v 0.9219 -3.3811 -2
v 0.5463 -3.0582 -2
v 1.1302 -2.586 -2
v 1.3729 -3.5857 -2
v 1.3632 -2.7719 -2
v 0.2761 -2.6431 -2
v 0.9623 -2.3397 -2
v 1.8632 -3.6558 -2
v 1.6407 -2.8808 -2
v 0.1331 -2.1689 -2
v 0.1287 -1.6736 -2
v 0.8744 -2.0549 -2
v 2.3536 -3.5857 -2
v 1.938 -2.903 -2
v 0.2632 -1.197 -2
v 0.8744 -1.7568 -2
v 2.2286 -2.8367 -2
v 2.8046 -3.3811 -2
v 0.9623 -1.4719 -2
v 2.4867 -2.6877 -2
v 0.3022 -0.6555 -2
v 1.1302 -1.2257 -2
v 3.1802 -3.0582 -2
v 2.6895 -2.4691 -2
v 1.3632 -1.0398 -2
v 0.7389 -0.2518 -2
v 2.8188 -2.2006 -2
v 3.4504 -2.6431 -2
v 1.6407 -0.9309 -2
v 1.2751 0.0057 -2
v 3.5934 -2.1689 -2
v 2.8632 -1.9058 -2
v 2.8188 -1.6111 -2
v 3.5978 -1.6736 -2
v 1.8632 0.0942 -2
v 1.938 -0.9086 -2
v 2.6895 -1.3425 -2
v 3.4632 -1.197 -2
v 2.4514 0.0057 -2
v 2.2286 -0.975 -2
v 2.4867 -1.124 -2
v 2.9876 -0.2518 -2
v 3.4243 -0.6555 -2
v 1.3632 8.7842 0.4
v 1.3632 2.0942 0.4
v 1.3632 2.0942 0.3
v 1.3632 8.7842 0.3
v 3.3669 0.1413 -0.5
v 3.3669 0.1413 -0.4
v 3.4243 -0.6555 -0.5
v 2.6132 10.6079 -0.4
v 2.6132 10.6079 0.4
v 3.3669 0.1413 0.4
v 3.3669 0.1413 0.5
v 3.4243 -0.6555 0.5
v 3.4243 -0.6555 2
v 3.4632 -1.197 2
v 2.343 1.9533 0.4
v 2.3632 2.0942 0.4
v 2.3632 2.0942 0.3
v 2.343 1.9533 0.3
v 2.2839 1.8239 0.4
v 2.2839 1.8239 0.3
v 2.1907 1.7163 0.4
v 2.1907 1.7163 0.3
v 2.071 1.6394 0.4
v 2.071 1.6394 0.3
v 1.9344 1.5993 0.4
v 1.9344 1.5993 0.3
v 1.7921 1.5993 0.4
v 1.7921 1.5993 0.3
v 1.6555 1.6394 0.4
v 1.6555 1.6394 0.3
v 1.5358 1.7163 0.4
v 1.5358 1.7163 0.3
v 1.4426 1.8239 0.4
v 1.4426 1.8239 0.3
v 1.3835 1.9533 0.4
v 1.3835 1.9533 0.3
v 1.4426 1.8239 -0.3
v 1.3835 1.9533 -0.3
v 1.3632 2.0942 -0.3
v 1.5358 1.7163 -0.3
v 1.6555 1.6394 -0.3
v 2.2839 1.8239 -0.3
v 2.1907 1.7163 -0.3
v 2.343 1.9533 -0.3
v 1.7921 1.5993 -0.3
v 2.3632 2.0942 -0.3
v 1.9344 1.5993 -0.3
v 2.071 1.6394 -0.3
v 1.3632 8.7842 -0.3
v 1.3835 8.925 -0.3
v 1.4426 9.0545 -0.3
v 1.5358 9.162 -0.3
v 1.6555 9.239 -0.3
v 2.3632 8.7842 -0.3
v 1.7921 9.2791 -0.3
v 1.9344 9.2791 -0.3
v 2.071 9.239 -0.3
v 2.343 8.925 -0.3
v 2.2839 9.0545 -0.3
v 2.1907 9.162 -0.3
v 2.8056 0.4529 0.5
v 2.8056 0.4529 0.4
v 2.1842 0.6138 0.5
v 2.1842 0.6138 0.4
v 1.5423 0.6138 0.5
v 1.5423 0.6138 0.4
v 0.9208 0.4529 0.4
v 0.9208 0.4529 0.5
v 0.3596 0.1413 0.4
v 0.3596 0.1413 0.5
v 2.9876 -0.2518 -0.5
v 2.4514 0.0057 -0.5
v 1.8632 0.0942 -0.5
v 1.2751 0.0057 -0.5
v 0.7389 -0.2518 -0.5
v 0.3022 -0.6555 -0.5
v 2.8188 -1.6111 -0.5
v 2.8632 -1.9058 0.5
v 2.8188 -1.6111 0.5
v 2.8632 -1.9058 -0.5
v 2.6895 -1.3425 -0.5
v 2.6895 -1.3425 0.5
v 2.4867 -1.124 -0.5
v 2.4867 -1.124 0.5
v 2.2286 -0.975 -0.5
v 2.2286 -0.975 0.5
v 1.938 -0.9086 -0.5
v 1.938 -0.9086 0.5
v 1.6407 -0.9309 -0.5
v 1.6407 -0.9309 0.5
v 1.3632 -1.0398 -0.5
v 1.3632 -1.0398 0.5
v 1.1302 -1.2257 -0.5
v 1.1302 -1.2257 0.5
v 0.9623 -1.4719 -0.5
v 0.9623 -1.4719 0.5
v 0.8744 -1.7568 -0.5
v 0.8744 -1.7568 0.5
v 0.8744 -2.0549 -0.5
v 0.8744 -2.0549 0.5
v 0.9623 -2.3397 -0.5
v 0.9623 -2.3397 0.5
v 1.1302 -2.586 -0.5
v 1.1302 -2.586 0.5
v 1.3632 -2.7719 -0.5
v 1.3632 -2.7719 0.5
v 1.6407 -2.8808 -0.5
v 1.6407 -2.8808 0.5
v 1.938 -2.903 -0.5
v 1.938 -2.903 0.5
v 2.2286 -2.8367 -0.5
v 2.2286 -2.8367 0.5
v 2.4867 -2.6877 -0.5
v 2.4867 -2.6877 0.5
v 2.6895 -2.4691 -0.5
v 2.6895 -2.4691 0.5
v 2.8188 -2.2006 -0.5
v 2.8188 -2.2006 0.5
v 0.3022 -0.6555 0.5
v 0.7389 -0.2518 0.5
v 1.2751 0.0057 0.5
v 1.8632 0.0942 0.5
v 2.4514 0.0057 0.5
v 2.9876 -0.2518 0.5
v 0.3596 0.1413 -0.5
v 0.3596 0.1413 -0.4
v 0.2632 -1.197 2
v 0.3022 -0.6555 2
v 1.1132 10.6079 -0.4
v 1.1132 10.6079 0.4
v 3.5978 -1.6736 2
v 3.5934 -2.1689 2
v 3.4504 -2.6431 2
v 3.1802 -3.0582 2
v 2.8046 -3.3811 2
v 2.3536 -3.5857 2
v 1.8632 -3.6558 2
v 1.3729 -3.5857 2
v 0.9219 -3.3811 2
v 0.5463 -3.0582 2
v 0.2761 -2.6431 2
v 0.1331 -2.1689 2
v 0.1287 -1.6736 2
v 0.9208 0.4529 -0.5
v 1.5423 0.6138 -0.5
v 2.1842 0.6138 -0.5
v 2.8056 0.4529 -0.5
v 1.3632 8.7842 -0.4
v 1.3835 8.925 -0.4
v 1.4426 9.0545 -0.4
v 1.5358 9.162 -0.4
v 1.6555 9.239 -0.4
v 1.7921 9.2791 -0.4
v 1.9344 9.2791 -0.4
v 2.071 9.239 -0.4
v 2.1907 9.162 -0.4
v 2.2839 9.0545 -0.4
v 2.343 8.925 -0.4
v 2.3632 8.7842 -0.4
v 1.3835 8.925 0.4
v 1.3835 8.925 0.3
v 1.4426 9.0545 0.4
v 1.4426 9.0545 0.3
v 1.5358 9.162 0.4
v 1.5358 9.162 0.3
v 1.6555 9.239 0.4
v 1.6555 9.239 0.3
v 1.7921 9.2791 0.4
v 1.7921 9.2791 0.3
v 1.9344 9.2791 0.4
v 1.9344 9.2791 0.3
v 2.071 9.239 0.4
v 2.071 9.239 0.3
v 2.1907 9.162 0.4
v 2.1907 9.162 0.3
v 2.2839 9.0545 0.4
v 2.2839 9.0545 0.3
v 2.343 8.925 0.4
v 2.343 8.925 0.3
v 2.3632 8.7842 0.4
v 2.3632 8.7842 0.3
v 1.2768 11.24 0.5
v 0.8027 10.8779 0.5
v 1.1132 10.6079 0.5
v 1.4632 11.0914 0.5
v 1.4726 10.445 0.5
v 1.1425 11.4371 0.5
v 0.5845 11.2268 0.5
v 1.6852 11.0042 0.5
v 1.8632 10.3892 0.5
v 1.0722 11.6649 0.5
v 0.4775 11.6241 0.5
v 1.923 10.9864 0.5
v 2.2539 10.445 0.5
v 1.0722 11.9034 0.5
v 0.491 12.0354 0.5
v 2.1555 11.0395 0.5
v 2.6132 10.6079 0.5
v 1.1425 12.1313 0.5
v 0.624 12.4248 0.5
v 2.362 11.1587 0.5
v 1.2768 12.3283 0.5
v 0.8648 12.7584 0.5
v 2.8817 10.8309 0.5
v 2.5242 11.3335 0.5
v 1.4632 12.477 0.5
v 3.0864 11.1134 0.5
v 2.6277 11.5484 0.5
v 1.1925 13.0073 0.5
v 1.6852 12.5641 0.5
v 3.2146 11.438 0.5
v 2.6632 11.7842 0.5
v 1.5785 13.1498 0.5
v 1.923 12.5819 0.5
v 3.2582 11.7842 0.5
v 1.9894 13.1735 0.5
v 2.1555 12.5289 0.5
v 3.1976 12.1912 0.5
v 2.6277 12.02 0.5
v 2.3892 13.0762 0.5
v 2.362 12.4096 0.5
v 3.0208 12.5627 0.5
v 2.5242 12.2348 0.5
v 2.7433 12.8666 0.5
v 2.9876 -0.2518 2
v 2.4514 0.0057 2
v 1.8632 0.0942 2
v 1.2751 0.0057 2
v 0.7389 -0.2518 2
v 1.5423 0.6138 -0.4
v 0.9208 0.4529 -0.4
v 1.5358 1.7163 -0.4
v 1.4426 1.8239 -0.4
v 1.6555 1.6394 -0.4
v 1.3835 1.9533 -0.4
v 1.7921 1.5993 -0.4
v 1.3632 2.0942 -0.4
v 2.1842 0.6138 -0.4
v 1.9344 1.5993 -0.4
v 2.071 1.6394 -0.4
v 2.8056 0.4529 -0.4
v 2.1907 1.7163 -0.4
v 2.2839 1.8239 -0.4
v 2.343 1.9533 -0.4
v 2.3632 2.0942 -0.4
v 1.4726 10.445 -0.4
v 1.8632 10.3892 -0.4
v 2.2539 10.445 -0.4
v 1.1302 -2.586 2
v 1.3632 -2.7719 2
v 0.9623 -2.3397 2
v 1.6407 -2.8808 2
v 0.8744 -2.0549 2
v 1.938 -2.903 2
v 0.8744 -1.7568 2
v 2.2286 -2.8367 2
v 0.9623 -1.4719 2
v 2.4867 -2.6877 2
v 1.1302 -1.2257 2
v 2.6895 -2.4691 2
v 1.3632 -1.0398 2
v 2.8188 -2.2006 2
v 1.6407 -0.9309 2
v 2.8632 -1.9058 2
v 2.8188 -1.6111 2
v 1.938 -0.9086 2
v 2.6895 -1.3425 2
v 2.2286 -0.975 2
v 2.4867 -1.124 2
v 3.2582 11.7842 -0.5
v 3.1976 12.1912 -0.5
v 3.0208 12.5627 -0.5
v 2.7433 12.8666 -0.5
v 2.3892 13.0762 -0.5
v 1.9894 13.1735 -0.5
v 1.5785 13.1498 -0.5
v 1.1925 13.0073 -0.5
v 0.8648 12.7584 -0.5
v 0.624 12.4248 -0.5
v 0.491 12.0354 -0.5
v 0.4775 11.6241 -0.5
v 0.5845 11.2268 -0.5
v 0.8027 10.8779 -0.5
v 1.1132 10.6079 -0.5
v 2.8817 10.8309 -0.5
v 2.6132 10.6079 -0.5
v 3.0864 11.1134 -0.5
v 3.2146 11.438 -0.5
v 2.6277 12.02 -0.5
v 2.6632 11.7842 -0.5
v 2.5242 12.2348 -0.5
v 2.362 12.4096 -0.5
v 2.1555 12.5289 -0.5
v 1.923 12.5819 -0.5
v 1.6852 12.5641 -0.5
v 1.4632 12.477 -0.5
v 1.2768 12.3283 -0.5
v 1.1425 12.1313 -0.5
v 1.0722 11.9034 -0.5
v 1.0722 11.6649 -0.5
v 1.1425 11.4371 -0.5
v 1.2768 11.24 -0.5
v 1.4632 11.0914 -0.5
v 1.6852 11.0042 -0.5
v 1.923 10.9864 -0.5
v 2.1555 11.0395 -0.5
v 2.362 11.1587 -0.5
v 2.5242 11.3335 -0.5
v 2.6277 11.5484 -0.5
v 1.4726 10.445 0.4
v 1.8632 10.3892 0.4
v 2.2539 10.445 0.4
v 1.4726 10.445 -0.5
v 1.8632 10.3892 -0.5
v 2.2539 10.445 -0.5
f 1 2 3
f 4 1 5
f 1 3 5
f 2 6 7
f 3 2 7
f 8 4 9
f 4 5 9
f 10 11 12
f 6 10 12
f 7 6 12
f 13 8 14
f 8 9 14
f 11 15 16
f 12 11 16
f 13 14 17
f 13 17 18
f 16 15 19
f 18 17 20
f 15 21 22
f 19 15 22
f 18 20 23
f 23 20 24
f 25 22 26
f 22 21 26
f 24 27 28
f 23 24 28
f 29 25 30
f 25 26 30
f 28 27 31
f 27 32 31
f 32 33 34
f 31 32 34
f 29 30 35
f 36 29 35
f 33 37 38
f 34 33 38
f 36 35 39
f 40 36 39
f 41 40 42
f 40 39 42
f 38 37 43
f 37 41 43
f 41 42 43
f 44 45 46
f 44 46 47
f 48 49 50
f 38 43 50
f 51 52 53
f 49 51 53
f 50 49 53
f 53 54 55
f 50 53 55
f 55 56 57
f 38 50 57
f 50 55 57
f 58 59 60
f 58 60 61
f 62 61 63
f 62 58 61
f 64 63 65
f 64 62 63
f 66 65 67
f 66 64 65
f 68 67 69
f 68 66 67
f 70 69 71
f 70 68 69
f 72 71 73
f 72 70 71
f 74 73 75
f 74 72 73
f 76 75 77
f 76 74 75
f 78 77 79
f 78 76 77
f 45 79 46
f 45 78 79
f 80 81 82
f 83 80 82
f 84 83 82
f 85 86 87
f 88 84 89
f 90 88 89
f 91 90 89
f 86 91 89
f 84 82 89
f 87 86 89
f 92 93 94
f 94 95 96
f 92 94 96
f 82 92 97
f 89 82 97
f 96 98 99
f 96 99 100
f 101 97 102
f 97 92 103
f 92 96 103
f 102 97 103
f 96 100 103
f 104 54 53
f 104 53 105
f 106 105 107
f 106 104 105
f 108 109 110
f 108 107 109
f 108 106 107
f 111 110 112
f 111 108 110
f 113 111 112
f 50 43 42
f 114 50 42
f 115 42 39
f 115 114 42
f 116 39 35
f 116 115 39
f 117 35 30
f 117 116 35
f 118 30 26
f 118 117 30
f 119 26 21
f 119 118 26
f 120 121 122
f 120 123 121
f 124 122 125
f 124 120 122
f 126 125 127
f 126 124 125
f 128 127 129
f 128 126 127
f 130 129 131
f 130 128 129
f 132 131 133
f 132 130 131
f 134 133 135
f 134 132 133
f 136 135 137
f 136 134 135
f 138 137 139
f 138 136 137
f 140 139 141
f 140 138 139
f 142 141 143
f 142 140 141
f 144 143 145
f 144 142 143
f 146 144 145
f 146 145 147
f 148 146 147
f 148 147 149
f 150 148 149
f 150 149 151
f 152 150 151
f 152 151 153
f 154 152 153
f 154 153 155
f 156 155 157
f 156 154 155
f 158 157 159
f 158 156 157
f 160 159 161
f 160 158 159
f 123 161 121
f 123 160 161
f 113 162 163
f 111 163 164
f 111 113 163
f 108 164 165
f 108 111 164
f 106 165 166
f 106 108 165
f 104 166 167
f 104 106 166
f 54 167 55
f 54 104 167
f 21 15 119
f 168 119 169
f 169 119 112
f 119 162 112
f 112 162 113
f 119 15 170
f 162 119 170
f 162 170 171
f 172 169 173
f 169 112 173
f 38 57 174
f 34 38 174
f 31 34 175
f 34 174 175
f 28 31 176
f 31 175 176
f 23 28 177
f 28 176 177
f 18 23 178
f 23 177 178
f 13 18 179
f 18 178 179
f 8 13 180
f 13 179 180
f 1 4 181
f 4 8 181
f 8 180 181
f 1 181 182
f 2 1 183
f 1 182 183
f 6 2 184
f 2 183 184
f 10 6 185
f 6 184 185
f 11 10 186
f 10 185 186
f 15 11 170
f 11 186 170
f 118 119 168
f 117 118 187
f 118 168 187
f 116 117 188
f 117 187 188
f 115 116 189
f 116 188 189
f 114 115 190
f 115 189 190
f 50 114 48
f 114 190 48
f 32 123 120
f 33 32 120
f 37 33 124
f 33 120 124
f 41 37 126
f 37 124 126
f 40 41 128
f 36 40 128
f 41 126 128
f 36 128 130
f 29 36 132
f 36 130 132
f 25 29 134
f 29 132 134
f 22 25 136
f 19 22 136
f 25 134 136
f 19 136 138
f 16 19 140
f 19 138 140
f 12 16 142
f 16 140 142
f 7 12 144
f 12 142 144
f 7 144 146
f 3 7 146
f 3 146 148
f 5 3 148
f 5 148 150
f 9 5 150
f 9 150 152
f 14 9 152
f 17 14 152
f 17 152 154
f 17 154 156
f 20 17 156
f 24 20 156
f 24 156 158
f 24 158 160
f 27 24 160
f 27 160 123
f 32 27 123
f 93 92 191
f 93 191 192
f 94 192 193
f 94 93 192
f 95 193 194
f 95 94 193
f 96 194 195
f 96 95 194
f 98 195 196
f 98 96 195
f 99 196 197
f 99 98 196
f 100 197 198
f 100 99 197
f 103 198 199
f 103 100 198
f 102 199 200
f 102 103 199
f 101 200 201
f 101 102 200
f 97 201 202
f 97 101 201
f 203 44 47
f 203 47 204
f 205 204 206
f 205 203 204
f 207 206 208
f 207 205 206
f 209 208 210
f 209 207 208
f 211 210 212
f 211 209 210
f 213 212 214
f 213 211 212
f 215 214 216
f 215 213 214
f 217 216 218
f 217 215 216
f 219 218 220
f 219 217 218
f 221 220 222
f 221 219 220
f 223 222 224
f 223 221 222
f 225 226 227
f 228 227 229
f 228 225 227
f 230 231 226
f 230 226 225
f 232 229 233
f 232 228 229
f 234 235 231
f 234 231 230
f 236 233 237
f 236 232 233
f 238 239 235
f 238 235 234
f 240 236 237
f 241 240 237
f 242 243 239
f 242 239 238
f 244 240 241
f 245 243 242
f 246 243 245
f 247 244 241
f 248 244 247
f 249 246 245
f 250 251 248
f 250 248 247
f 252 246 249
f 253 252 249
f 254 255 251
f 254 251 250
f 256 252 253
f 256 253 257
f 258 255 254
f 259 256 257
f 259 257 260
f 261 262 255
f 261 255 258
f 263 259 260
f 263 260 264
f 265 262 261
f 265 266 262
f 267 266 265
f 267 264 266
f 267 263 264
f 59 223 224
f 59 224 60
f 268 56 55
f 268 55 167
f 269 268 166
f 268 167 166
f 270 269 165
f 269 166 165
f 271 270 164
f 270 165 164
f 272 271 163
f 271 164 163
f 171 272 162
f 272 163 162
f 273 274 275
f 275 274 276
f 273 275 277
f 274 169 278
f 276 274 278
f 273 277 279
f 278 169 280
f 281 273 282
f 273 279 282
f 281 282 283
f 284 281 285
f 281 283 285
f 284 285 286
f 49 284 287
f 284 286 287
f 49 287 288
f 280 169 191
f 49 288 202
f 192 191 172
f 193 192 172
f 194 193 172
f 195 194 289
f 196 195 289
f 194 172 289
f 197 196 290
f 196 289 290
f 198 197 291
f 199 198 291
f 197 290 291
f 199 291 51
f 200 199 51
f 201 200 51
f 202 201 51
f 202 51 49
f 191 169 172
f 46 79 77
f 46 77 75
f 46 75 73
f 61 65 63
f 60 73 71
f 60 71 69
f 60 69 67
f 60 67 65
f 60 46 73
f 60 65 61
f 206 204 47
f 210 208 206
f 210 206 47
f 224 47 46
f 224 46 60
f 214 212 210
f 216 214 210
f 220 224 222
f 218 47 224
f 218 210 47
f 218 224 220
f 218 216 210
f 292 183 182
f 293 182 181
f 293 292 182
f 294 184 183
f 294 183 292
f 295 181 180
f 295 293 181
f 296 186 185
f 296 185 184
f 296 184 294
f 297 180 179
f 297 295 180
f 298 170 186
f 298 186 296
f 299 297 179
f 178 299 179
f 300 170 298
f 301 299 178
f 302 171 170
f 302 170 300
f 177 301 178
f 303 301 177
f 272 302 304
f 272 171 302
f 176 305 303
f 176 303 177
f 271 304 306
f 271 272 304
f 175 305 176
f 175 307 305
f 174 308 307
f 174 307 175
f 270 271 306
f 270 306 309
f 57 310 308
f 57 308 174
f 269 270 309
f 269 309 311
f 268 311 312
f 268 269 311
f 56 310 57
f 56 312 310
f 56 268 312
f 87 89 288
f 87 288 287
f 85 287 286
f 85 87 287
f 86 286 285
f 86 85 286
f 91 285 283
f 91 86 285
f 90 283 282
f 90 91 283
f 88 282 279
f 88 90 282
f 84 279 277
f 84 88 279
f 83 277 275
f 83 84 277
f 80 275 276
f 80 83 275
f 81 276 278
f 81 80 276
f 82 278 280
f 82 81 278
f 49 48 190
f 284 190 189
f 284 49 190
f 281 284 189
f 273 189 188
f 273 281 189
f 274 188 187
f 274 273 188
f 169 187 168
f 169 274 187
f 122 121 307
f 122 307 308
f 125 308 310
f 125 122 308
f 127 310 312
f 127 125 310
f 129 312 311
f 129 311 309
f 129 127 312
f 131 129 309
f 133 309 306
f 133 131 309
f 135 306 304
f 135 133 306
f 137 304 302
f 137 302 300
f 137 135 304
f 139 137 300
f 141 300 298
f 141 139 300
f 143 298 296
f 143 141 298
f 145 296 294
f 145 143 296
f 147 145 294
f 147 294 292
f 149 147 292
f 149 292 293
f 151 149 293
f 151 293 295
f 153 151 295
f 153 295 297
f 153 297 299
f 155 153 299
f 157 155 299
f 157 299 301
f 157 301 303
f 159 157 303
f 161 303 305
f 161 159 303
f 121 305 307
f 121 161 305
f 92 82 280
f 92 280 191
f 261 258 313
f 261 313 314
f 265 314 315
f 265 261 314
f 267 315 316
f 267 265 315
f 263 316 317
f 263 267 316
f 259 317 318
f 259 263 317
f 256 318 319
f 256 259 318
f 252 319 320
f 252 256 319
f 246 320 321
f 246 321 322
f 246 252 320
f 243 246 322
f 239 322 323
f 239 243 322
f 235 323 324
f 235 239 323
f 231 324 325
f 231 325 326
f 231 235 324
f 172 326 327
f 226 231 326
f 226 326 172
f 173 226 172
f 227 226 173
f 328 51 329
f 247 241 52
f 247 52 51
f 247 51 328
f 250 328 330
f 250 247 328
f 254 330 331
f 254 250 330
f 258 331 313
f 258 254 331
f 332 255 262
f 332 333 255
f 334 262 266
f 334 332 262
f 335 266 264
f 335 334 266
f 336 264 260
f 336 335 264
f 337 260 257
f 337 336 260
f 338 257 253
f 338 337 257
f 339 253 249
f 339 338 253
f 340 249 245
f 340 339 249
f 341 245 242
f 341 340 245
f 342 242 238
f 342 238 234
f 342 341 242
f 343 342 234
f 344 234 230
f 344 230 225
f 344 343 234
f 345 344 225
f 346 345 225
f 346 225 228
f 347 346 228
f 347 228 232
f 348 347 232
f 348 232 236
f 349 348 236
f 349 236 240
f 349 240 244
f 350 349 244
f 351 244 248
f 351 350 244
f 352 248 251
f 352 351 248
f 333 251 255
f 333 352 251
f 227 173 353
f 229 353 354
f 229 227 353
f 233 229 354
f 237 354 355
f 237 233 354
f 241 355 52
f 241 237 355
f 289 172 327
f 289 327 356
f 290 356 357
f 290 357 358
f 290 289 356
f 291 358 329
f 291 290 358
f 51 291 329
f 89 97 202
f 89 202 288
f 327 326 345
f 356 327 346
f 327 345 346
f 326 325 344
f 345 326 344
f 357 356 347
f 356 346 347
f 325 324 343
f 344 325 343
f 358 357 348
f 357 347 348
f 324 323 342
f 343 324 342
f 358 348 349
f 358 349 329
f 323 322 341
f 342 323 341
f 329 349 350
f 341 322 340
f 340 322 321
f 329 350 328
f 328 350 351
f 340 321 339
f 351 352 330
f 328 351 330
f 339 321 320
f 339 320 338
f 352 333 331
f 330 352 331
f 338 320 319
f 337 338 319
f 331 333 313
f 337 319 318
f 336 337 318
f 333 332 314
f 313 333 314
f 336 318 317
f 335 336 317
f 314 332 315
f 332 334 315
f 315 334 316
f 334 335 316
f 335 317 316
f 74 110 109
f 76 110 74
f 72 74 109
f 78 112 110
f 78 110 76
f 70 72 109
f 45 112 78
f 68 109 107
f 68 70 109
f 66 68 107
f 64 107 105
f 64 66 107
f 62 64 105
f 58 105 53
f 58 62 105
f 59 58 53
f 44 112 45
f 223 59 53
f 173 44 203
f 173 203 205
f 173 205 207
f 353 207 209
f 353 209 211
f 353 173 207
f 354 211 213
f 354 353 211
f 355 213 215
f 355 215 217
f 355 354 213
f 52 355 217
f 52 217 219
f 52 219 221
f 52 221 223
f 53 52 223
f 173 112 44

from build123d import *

# Parameters (mm, degrees)
SKETCH1_R                = 13.95
SKETCH1_R_2              = 8
BOSS_EXTRUDE1_DEPTH      = 5
SKETCH1_R_3              = 25.4
SKETCH1_R_4              = 10
BOSS_EXTRUDE1_2_DEPTH    = 5
BOSS_EXTRUDE2_DEPTH      = 4
BOSS_EXTRUDE3_DEPTH      = 3
BOSS_EXTRUDE4_DEPTH      = 15
BOSS_EXTRUDE4_DEPTH_BACK = 25
SKETCH3_R                = 20
SKETCH3_R_2              = 10
CUT_EXTRUDE1_DEPTH       = 27.5
SCALE2_SCALE             = 0.1


with BuildPart() as part:
    # Sketch1 → Boss-Extrude1 (new, symmetric)
    with BuildSketch(Plane.XY):
        with Locations((1.863247881, 104.324265103)):
            Circle(SKETCH1_R)
        with Locations((1.863247881, 104.324265103)):
            Circle(SKETCH1_R_2, mode=Mode.SUBTRACT)
    extrude(amount=BOSS_EXTRUDE1_DEPTH, both=True)



with BuildPart() as body_2:
    # Sketch1 → Boss-Extrude1 2 (new, symmetric)
    with BuildSketch(Plane.XY):
        with Locations((1.863247881, -32.575734897)):
            Circle(SKETCH1_R_3)
        with Locations((1.863247881, -32.575734897)):
            Circle(SKETCH1_R_4, mode=Mode.SUBTRACT)
    extrude(amount=BOSS_EXTRUDE1_2_DEPTH, both=True)


with BuildPart() as part_1:
    add(part.part)

    add(body_2.part)  # Boss-Extrude2 merges body 2
    # Sketch1<3> → Boss-Extrude2 (add, symmetric)
    with BuildSketch(Plane.XY):
        with BuildLine():
            ThreePointArc((9.363247881, 92.561931151), (1.863247881, 90.374265103), (-5.636752119, 92.561931151))
            Line((-5.636752119, 92.561931151), (-14.636752119, -13.264857133))
            ThreePointArc((-14.636752119, -13.264857133), (1.863247881, -7.175734897), (18.363247881, -13.264857133))
            Line((18.363247881, -13.264857133), (9.363247881, 92.561931151))
        make_face()
        with BuildLine():
            ThreePointArc((-3.136752119, 74.324265103), (1.863247881, 79.324265103), (6.863247881, 74.324265103))
            Line((6.863247881, 74.324265103), (6.863247881, 7.424265103))
            ThreePointArc((6.863247881, 7.424265103), (1.863247881, 2.424265103), (-3.136752119, 7.424265103))
            Line((-3.136752119, 7.424265103), (-3.136752119, 74.324265103))
        make_face(mode=Mode.SUBTRACT)
    extrude(amount=BOSS_EXTRUDE2_DEPTH, both=True)

    # Sketch1<4> → Boss-Extrude3 (add, symmetric)
    with BuildSketch(Plane.XY):
        with BuildLine():
            Line((6.863247881, 7.424265103), (6.863247881, 74.324265103))
            ThreePointArc((6.863247881, 74.324265103), (1.863247881, 79.324265103), (-3.136752119, 74.324265103))
            Line((-3.136752119, 74.324265103), (-3.136752119, 7.424265103))
            ThreePointArc((-3.136752119, 7.424265103), (1.863247881, 2.424265103), (6.863247881, 7.424265103))
        make_face()
    extrude(amount=BOSS_EXTRUDE3_DEPTH, both=True)

    # Sketch3 → Boss-Extrude4 (add, two sides: drawn at the far end of the back side and taken through both)
    with BuildSketch(Plane.XY.offset(5).offset(-BOSS_EXTRUDE4_DEPTH_BACK)):
        with Locations((1.863247881, -32.575734897)):
            Circle(SKETCH3_R)
        with Locations((1.863247881, -32.575734897)):
            Circle(SKETCH3_R_2, mode=Mode.SUBTRACT)
    extrude(amount=BOSS_EXTRUDE4_DEPTH + BOSS_EXTRUDE4_DEPTH_BACK)

    # Sketch4 → Cut-Extrude1 (cut, symmetric)
    with BuildSketch(Plane.XY):
        with BuildLine():
            Line((-5.636752119, 92.561931151), (-25.096940363, -6.510465862))
            ThreePointArc((-25.096940363, -6.510465862), (1.863247881, -70.075734897), (28.823436125, -6.510465862))
            Line((28.823436125, -6.510465862), (9.363247881, 92.561931151))
            Line((9.363247881, 92.561931151), (17.863247881, -25.487011458))
            ThreePointArc((17.863247881, -25.487011458), (1.863247881, -50.075734897), (-14.136752119, -25.487011458))
            Line((-14.136752119, -25.487011458), (-5.636752119, 92.561931151))
        make_face()
    extrude(amount=CUT_EXTRUDE1_DEPTH, both=True, mode=Mode.SUBTRACT)


with BuildPart() as part_2:
    # Scale2: scaled about (1.863247881, 1.50194237, 0)
    add(part_1.part.scale(SCALE2_SCALE).moved(Location((1.676923093, 1.351748133, 0))))


solid = part_2.part
